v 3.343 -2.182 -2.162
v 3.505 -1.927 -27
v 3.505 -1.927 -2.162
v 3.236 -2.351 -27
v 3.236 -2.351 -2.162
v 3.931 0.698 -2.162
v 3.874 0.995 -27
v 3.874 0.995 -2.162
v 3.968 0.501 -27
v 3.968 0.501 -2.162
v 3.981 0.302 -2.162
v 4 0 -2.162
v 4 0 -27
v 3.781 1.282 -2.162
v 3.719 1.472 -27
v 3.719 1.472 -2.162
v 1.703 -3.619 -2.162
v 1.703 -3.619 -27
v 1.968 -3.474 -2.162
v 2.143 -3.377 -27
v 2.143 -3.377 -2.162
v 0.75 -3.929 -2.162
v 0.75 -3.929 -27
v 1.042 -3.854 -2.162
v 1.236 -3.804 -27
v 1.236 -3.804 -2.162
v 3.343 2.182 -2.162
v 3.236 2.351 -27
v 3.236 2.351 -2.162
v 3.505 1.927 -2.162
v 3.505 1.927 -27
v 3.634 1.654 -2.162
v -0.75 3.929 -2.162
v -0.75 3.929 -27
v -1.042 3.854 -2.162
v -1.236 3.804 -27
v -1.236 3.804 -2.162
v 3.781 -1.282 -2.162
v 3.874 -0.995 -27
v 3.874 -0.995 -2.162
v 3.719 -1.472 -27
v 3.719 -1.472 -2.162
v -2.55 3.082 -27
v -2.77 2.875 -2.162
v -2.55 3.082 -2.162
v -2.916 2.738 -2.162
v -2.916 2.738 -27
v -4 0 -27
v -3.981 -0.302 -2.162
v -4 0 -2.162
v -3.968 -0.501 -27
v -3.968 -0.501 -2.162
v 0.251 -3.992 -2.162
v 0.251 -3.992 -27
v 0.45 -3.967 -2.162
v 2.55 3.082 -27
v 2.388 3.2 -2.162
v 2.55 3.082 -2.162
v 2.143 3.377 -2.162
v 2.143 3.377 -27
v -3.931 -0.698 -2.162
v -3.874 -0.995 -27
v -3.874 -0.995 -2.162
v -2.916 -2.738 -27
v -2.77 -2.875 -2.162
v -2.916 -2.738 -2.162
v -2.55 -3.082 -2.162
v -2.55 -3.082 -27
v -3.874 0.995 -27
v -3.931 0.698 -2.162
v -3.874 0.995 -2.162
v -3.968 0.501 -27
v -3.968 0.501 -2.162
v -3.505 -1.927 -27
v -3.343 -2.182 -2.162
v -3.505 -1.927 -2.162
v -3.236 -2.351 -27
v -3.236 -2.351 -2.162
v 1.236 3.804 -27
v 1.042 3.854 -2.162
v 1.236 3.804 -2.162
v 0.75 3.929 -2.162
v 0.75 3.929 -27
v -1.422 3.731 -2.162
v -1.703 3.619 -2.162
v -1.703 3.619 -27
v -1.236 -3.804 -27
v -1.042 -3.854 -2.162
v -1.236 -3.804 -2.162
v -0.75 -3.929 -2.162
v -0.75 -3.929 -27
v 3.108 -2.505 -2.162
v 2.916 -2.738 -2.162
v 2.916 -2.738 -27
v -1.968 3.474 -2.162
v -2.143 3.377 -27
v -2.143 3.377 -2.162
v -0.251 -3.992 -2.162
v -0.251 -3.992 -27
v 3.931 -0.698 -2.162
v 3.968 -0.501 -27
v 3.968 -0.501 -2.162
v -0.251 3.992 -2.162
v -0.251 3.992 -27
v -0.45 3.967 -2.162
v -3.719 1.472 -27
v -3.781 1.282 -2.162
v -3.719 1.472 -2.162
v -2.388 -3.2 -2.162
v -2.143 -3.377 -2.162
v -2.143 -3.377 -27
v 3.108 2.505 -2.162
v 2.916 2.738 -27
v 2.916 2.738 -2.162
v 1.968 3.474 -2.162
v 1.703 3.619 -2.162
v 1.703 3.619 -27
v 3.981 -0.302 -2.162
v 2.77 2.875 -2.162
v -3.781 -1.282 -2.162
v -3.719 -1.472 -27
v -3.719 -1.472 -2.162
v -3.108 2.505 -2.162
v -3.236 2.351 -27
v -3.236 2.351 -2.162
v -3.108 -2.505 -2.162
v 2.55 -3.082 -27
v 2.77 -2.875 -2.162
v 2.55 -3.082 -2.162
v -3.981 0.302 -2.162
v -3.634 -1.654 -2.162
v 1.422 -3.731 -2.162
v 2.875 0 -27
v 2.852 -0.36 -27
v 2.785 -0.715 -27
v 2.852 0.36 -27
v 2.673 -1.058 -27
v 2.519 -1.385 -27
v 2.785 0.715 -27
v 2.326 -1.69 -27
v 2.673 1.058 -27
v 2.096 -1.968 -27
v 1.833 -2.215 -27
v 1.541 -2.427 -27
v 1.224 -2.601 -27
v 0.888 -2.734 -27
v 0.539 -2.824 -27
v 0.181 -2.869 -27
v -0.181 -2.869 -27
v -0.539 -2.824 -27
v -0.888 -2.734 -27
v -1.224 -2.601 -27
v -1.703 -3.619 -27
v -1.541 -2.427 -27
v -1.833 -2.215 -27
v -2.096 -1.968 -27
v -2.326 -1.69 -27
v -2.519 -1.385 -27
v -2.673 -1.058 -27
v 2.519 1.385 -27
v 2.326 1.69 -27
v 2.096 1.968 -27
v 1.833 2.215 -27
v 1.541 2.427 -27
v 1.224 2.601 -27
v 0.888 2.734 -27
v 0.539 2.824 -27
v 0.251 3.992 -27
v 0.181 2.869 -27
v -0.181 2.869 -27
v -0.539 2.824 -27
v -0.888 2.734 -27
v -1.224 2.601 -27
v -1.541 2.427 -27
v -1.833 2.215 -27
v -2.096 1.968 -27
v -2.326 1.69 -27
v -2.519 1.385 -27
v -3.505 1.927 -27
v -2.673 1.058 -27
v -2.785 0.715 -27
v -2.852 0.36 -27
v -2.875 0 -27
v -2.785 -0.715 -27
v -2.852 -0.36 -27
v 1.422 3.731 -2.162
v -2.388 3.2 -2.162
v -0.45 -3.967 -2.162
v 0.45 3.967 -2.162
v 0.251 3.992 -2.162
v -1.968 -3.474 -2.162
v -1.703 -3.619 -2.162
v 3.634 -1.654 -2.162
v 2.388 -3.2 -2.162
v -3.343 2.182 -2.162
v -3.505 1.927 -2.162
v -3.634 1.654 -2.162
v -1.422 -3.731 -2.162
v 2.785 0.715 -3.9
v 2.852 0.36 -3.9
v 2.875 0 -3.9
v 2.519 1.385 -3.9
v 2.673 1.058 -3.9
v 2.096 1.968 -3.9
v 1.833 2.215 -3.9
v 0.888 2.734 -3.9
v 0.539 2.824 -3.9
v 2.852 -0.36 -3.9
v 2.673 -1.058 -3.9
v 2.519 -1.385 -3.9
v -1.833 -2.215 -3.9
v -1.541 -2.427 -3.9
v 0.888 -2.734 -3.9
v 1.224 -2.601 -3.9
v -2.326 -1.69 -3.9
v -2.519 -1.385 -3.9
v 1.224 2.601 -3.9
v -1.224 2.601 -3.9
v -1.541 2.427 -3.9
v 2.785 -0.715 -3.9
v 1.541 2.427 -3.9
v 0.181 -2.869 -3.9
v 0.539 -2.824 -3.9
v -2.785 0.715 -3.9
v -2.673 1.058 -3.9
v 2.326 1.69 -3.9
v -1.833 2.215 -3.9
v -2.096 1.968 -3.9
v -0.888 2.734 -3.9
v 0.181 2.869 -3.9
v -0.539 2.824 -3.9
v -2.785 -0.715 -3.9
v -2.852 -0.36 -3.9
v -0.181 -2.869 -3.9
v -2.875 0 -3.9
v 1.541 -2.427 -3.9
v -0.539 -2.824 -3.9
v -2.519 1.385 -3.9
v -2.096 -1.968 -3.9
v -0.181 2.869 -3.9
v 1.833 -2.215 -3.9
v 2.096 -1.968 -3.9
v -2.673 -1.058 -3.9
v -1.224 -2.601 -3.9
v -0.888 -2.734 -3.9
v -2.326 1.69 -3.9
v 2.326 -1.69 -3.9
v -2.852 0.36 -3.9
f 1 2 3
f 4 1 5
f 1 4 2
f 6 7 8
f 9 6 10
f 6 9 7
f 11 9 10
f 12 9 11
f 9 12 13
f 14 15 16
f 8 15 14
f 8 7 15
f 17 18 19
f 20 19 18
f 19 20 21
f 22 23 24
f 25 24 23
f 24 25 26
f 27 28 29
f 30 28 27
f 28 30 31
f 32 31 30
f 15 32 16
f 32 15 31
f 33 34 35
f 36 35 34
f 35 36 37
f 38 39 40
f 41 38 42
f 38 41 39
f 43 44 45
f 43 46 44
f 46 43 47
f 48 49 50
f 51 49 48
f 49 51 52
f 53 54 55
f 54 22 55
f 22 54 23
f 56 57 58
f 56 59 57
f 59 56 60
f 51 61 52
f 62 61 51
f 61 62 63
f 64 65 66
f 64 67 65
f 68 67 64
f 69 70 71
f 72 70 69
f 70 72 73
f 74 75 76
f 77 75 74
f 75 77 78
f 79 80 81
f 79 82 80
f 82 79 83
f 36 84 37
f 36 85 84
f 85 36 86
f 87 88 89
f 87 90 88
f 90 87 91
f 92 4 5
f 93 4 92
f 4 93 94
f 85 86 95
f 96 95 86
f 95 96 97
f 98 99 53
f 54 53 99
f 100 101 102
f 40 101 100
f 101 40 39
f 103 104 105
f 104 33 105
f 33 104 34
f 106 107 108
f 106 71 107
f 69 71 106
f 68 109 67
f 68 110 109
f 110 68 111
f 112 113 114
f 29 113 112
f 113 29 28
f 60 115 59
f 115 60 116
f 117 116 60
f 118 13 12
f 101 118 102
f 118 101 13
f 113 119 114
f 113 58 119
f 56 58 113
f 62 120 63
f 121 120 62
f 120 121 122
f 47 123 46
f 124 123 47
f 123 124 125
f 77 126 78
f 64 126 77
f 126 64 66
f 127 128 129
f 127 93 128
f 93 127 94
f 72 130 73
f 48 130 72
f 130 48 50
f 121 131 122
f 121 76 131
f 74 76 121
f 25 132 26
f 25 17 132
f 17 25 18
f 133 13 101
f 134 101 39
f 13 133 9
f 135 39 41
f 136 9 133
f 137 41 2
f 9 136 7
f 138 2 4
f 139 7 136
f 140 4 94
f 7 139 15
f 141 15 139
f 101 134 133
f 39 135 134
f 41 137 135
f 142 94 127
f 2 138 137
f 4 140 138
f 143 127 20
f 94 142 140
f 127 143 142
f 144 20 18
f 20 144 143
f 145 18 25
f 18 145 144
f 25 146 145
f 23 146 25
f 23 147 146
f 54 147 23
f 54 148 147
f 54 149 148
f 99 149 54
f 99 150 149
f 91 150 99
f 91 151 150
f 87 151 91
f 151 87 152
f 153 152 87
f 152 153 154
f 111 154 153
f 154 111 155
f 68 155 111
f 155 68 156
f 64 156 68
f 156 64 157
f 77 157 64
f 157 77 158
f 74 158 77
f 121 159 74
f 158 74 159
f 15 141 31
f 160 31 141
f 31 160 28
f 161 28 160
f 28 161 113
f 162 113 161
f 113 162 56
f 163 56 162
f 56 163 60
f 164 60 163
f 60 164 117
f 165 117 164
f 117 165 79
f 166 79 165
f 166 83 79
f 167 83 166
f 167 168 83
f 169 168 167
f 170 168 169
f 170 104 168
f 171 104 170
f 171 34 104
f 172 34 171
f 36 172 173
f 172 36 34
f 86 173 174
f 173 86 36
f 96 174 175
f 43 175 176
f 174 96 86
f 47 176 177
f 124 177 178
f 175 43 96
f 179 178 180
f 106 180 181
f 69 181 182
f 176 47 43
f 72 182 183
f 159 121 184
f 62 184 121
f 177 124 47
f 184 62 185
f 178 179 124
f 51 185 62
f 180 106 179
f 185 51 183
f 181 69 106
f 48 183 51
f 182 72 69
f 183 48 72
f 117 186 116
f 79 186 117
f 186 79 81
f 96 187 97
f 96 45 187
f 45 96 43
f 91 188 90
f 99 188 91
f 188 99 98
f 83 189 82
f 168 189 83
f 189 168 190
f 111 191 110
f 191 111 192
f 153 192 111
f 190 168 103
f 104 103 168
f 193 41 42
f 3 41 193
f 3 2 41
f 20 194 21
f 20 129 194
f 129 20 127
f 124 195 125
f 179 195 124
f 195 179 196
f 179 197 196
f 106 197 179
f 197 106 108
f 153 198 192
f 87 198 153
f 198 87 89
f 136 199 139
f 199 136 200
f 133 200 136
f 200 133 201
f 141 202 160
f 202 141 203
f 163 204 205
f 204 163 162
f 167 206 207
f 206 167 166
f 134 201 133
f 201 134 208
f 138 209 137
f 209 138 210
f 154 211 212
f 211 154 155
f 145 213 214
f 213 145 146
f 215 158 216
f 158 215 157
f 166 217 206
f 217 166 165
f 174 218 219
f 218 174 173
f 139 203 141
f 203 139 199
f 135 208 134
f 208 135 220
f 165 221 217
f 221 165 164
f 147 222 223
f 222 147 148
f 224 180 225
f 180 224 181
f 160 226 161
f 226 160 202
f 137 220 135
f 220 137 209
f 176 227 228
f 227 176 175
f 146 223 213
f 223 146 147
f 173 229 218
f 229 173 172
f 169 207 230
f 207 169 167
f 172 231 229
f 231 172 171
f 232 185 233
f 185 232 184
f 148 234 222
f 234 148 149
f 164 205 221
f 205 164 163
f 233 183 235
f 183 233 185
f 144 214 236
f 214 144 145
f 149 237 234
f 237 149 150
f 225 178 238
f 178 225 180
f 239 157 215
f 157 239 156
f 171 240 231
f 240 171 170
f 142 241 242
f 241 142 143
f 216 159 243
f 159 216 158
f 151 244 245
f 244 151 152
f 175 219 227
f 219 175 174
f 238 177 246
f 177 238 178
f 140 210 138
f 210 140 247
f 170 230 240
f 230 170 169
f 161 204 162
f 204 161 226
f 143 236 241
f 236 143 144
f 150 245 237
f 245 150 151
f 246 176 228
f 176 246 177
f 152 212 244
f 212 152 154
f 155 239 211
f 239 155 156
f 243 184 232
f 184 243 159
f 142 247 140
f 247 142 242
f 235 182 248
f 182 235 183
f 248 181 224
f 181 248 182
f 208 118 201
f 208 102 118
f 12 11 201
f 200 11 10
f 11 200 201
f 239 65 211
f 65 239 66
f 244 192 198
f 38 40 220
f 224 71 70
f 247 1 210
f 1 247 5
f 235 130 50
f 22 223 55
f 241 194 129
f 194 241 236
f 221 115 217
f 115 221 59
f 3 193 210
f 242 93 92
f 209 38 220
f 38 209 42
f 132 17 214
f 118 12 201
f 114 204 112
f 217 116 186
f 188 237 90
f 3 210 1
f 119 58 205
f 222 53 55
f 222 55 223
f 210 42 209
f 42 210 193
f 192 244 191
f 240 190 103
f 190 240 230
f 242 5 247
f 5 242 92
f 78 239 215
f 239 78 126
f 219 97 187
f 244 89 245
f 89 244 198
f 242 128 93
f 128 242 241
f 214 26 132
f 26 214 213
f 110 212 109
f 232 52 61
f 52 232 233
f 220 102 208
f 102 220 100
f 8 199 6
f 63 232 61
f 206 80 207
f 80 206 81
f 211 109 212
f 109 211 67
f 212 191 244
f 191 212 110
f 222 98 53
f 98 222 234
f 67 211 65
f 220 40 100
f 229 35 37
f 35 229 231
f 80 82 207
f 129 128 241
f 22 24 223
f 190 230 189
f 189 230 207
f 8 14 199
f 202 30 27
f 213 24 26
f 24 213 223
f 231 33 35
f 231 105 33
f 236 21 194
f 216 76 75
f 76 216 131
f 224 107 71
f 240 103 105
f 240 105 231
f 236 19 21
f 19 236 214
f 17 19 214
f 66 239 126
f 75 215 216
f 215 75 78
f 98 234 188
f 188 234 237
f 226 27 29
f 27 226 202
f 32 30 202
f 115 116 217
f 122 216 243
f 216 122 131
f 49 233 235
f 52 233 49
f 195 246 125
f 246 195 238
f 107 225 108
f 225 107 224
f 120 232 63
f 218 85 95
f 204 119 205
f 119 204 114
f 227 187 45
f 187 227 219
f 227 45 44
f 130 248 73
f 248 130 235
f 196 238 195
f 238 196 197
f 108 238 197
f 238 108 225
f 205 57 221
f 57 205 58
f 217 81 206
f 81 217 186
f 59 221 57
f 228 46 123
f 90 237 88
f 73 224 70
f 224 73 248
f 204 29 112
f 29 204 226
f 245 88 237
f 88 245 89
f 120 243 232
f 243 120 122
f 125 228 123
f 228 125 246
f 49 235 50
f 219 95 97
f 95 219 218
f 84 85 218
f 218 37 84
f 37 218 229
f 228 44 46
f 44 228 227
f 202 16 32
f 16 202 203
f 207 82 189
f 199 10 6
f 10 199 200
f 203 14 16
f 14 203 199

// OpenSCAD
$fn = 50;

difference() {
	union() {
		translate(v = [0, 0, -27.0]) {
			cylinder(h = 27, r = 4.0);
		}
		#translate(v = [0, 0, -30.0]) {
			cylinder(h = 30, r = 2.875);
		}
	}
	union() {
		translate(v = [0, 0, 0]) {
			rotate(a = [0, 0, 0]) {
				difference() {
					union() {
						translate(v = [0, 0, -30.0]) {
							cylinder(h = 30, r = 2.6);
						}
						translate(v = [0, 0, -3.9]) {
							cylinder(h = 3.9, r1 = 2.875, r2 = 5.4);
						}
						translate(v = [0, 0, -30.0]) {
							cylinder(h = 30, r = 2.875);
						}
						translate(v = [0, 0, -30.0]) {
							cylinder(h = 30, r = 2.6);
						}
					}
					union();
				}
			}
		}
	}
}
